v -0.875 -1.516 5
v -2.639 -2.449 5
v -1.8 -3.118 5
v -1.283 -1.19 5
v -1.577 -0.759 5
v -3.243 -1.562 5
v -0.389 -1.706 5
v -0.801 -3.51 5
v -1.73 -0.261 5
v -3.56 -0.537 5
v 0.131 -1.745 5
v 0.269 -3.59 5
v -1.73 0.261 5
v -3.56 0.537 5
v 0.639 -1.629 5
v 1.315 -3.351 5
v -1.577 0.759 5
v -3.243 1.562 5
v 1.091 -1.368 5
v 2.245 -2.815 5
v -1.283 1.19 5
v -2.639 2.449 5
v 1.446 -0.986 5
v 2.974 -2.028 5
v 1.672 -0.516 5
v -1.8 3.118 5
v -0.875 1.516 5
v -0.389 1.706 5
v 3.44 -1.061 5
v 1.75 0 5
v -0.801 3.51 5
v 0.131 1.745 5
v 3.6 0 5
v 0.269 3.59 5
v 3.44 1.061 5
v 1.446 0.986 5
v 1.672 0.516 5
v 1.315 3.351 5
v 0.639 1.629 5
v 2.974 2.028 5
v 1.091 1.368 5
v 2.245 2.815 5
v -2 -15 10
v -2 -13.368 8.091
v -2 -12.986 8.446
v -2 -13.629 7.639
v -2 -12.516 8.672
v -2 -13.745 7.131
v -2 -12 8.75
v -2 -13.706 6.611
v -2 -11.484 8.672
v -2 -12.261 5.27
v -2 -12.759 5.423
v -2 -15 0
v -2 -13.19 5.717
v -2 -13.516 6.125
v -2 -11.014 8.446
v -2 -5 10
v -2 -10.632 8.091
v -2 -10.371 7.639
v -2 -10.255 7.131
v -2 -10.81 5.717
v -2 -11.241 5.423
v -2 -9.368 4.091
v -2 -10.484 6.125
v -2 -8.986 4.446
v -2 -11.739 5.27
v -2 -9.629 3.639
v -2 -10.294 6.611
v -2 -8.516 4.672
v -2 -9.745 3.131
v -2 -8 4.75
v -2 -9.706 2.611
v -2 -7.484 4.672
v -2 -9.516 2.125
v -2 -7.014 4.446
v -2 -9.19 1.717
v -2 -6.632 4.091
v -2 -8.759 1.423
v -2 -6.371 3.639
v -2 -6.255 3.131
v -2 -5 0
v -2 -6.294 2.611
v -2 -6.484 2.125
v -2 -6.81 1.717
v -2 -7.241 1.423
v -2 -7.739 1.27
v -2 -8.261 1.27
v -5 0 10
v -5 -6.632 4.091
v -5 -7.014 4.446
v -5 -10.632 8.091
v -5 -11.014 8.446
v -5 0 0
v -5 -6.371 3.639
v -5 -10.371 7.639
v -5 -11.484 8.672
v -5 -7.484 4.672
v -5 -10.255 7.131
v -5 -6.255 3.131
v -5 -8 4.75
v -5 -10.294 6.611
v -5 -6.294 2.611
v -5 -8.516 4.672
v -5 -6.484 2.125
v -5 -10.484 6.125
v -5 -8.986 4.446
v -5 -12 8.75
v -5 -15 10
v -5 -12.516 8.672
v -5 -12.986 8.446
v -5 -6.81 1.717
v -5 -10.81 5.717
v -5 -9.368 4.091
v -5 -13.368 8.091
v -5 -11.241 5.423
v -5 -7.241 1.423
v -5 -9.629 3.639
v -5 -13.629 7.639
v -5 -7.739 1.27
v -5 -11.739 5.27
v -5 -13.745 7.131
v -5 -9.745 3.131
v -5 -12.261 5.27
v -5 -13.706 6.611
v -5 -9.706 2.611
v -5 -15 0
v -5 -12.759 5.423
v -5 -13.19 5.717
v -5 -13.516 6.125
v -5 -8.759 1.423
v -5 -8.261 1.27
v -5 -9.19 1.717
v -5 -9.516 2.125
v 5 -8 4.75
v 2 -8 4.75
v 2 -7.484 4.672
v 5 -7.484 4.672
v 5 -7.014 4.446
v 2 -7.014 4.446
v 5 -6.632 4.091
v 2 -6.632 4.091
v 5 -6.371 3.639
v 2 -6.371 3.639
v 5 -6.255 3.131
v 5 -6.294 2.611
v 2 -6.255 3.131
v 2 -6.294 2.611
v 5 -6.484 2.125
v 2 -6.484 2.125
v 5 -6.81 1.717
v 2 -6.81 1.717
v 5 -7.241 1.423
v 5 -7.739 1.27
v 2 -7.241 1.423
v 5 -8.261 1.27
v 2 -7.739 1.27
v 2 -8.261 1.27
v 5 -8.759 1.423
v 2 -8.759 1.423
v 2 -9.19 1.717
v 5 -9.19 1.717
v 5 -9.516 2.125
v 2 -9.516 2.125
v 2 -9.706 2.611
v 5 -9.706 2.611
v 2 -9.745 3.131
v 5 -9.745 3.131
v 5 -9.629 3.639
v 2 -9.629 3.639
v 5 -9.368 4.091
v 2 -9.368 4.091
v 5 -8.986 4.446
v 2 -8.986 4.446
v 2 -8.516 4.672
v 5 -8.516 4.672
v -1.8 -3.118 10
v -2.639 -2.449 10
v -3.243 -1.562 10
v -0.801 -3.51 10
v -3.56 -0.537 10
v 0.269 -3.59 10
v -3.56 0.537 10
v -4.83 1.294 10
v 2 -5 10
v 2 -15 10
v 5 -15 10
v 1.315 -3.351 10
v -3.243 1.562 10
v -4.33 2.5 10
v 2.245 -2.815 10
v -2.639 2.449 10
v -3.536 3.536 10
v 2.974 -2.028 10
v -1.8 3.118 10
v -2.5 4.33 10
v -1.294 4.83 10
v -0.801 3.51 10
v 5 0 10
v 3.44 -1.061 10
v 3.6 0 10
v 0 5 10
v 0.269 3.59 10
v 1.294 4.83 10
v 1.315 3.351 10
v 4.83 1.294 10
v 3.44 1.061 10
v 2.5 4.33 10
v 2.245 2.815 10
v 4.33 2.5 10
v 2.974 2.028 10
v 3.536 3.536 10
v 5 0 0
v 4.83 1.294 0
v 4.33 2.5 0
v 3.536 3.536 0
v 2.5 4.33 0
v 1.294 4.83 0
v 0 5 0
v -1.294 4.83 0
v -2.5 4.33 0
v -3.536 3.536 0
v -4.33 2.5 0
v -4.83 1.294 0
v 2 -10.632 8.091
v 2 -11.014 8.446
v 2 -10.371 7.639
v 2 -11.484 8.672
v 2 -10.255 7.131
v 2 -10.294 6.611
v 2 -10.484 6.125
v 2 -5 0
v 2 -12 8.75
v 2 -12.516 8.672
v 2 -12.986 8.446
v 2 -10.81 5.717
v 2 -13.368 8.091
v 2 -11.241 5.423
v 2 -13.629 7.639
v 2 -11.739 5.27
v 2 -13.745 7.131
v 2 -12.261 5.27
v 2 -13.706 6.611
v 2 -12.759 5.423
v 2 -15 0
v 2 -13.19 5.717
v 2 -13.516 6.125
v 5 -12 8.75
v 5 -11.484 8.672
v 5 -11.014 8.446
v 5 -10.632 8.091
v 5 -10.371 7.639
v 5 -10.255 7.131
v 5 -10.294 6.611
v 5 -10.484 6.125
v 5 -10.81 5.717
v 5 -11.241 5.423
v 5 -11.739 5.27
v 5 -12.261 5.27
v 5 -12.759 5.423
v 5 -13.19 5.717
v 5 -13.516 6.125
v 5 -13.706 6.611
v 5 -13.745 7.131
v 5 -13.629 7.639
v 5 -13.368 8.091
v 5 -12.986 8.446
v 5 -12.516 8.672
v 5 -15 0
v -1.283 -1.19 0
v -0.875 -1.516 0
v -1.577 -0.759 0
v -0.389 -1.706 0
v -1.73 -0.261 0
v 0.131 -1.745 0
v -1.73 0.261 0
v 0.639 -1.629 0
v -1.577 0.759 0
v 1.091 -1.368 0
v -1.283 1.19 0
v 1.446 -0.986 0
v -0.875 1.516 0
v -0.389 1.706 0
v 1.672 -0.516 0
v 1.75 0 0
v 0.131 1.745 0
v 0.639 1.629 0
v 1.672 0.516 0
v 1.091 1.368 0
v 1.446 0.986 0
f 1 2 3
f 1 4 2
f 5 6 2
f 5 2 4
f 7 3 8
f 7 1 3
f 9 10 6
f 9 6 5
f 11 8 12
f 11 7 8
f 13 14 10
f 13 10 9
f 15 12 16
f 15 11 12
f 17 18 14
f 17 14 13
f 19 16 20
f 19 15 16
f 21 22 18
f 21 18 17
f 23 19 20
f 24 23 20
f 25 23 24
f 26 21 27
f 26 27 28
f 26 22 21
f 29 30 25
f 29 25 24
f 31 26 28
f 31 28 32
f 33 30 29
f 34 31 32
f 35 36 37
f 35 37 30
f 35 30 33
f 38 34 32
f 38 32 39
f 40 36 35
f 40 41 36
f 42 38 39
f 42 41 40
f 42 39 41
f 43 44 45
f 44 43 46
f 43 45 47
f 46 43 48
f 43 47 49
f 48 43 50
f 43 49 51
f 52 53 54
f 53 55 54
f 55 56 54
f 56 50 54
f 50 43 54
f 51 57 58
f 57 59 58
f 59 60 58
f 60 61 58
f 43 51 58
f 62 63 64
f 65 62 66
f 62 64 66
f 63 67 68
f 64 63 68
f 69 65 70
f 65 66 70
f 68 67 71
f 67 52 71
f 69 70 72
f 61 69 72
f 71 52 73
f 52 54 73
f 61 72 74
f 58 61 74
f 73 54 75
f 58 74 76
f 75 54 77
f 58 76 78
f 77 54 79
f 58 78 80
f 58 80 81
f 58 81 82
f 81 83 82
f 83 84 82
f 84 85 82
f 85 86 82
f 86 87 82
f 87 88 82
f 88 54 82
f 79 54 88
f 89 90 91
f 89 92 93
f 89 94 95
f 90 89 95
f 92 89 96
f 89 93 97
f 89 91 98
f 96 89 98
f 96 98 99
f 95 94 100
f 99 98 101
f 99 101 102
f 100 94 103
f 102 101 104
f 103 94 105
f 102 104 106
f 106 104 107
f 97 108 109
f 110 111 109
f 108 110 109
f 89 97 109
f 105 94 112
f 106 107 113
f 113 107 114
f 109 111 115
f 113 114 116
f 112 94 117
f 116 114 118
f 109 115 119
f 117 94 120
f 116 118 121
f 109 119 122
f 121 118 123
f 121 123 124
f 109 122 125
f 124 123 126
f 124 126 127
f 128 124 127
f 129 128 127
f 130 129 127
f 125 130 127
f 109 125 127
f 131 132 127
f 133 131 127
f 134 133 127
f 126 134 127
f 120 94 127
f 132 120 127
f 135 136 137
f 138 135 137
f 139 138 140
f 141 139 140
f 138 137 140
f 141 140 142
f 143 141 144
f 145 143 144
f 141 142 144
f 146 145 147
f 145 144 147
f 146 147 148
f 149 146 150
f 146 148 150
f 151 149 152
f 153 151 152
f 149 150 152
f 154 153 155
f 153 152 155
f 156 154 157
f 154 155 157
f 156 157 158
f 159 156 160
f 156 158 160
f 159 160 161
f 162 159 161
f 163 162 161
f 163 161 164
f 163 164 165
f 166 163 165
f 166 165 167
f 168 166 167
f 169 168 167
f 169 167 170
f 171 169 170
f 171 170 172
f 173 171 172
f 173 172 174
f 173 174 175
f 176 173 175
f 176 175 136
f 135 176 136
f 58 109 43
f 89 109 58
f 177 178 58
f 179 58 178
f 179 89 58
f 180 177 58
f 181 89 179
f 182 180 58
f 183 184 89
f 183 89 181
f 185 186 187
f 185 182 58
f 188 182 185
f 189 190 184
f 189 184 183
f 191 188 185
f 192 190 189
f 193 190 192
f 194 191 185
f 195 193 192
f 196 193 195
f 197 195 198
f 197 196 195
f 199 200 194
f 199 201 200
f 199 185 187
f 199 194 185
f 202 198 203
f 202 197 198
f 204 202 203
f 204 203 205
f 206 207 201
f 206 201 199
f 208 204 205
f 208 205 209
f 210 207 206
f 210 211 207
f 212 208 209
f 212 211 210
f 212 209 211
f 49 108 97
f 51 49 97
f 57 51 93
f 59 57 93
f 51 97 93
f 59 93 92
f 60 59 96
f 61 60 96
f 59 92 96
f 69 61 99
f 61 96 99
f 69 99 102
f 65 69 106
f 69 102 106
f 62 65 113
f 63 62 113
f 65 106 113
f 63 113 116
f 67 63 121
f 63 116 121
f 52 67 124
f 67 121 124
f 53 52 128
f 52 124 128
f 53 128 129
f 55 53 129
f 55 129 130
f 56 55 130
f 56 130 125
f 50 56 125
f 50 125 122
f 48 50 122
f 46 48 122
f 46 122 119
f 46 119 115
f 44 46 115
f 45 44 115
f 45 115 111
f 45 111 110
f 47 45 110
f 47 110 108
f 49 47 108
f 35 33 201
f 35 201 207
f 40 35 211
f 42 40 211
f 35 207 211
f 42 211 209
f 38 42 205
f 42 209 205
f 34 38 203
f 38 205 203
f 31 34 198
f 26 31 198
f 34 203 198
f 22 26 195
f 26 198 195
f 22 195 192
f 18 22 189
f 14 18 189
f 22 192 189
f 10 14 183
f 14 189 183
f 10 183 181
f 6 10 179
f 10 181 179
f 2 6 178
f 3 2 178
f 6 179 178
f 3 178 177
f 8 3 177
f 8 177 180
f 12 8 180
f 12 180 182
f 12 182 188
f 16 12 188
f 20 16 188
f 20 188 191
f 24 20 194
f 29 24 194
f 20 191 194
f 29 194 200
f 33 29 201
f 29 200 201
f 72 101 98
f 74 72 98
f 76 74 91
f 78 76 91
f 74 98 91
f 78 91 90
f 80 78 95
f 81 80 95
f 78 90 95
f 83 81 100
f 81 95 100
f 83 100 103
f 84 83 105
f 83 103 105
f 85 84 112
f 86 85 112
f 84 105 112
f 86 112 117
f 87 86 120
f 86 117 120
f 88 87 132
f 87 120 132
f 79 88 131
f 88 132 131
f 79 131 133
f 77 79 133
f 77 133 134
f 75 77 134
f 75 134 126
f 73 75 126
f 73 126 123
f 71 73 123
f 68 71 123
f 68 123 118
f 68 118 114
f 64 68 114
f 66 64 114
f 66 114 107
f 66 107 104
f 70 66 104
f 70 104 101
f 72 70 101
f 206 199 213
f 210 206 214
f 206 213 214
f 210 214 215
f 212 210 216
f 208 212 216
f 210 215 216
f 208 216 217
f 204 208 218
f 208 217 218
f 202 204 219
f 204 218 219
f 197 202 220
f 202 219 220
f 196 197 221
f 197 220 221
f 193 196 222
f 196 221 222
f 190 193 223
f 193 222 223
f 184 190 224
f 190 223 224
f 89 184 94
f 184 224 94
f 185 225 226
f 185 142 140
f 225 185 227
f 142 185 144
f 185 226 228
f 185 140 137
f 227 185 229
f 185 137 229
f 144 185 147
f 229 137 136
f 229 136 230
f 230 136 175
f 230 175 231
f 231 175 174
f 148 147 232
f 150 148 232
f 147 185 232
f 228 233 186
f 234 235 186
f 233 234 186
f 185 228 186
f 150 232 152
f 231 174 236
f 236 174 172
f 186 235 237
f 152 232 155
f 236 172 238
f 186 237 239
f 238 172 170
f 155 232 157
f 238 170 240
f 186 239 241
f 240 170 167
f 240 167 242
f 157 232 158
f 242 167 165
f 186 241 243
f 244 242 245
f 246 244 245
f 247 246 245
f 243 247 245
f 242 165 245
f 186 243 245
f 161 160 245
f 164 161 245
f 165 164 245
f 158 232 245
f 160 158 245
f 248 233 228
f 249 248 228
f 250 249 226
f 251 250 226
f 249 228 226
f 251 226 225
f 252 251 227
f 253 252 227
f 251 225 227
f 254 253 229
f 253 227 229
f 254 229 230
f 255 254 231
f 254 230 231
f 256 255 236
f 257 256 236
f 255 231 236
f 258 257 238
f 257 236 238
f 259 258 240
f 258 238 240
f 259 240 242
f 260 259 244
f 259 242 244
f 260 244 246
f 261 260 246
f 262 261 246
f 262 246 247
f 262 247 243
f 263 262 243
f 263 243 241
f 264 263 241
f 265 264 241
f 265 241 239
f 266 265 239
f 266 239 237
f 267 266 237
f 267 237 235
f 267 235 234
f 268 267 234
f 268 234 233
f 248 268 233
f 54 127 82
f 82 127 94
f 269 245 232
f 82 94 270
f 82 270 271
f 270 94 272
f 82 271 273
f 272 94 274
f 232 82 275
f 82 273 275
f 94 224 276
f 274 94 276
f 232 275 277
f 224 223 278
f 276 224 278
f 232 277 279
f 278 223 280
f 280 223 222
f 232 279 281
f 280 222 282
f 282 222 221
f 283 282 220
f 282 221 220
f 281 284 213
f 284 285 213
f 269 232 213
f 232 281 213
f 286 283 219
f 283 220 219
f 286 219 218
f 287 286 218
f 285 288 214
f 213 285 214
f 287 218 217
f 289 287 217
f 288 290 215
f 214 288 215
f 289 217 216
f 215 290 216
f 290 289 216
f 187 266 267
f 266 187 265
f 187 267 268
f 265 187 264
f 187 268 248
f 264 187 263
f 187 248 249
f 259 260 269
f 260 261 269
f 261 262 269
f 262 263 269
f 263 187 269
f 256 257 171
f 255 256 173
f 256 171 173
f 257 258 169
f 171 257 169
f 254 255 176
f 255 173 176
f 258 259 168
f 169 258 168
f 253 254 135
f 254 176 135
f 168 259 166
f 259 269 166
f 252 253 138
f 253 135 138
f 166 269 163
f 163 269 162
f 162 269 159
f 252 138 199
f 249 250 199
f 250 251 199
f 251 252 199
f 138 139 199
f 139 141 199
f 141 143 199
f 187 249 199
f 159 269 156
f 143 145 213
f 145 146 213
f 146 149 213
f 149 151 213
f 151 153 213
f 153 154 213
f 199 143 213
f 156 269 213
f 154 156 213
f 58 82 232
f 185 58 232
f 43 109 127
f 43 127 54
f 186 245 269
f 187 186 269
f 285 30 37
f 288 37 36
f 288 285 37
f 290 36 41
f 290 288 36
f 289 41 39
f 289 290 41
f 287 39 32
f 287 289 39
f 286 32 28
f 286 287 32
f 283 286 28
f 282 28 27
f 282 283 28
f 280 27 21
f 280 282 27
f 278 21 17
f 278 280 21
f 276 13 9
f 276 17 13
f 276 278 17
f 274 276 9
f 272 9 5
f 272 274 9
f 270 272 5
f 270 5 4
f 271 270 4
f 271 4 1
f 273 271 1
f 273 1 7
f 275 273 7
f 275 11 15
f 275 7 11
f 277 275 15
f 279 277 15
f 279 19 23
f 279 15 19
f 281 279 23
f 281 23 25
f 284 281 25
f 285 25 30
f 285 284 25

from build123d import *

# Parameters (mm, degrees)
ESBO_O1_R                = 5
ESBO_O1_R_2              = 1.75
RESSALTO_EXTRUS_O1_DEPTH = 10
ESBO_O2_R                = 3.6
CORTE_EXTRUS_O1_DEPTH    = 5
RESSALTO_EXTRUS_O2_START = -10
RESSALTO_EXTRUS_O2_DEPTH = 10
ESBO_O4_R                = 1.75
CORTE_EXTRUS_O2_DEPTH    = 10


with BuildPart() as part:
    # Esboço1 → Ressalto-extrusão1 (new body)
    with BuildSketch(Plane.XY):
        Circle(ESBO_O1_R)
        Circle(ESBO_O1_R_2, mode=Mode.SUBTRACT)
    extrude(amount=RESSALTO_EXTRUS_O1_DEPTH)

    # Esboço2 → Corte-extrusão1 (cut)
    with BuildSketch(Plane.XY.offset(10)):
        Circle(ESBO_O2_R)
    extrude(amount=-CORTE_EXTRUS_O1_DEPTH, mode=Mode.SUBTRACT)

    # Esboço3 → Ressalto-extrusão2 (add)
    with BuildSketch(Plane.XY.offset(10).offset(RESSALTO_EXTRUS_O2_START)):
        with BuildLine():
            Line((2, -4.582575695), (2, -5))
            Line((2, -5), (2, -15))
            Line((2, -15), (5, -15))
            Line((5, -15), (5, 0))
            ThreePointArc((5, 0), (4.183300133, -2.738612788), (2, -4.582575695))
        make_face()
        with BuildLine():
            Line((-2, -15), (-2, -5))
            Line((-2, -5), (-2, -4.582575695))
            ThreePointArc((-2, -4.582575695), (-4.183300133, -2.738612788), (-5, 0))
            Line((-5, 0), (-5, -15))
            Line((-5, -15), (-2, -15))
        make_face()
        with BuildLine():
            Line((-2, -5), (3e-09, -5))
            ThreePointArc((3e-09, -5), (-1.021548217, -4.894531565), (-2, -4.582575695))
            Line((-2, -4.582575695), (-2, -5))
        make_face()
        with BuildLine():
            Line((3e-09, -5), (2, -5))
            Line((2, -5), (2, -4.582575695))
            ThreePointArc((2, -4.582575695), (1.02154822, -4.894531564), (3e-09, -5))
        make_face()
        with BuildLine():
            ThreePointArc((-2, -4.582575695), (-1.021548217, -4.894531565), (3e-09, -5))
            ThreePointArc((3e-09, -5), (1.02154822, -4.894531564), (2, -4.582575695))
            Line((2, -4.582575695), (-2, -4.582575695))
        make_face()
    extrude(amount=RESSALTO_EXTRUS_O2_DEPTH)

    # Esboço4 → Corte-extrusão2 (cut)
    with BuildSketch(Plane.ZY.offset(5)):
        with Locations((7, -12)):
            Circle(ESBO_O4_R)
        with Locations((3, -8)):
            Circle(ESBO_O4_R)
    extrude(amount=-CORTE_EXTRUS_O2_DEPTH, mode=Mode.SUBTRACT)


solid = part.part
